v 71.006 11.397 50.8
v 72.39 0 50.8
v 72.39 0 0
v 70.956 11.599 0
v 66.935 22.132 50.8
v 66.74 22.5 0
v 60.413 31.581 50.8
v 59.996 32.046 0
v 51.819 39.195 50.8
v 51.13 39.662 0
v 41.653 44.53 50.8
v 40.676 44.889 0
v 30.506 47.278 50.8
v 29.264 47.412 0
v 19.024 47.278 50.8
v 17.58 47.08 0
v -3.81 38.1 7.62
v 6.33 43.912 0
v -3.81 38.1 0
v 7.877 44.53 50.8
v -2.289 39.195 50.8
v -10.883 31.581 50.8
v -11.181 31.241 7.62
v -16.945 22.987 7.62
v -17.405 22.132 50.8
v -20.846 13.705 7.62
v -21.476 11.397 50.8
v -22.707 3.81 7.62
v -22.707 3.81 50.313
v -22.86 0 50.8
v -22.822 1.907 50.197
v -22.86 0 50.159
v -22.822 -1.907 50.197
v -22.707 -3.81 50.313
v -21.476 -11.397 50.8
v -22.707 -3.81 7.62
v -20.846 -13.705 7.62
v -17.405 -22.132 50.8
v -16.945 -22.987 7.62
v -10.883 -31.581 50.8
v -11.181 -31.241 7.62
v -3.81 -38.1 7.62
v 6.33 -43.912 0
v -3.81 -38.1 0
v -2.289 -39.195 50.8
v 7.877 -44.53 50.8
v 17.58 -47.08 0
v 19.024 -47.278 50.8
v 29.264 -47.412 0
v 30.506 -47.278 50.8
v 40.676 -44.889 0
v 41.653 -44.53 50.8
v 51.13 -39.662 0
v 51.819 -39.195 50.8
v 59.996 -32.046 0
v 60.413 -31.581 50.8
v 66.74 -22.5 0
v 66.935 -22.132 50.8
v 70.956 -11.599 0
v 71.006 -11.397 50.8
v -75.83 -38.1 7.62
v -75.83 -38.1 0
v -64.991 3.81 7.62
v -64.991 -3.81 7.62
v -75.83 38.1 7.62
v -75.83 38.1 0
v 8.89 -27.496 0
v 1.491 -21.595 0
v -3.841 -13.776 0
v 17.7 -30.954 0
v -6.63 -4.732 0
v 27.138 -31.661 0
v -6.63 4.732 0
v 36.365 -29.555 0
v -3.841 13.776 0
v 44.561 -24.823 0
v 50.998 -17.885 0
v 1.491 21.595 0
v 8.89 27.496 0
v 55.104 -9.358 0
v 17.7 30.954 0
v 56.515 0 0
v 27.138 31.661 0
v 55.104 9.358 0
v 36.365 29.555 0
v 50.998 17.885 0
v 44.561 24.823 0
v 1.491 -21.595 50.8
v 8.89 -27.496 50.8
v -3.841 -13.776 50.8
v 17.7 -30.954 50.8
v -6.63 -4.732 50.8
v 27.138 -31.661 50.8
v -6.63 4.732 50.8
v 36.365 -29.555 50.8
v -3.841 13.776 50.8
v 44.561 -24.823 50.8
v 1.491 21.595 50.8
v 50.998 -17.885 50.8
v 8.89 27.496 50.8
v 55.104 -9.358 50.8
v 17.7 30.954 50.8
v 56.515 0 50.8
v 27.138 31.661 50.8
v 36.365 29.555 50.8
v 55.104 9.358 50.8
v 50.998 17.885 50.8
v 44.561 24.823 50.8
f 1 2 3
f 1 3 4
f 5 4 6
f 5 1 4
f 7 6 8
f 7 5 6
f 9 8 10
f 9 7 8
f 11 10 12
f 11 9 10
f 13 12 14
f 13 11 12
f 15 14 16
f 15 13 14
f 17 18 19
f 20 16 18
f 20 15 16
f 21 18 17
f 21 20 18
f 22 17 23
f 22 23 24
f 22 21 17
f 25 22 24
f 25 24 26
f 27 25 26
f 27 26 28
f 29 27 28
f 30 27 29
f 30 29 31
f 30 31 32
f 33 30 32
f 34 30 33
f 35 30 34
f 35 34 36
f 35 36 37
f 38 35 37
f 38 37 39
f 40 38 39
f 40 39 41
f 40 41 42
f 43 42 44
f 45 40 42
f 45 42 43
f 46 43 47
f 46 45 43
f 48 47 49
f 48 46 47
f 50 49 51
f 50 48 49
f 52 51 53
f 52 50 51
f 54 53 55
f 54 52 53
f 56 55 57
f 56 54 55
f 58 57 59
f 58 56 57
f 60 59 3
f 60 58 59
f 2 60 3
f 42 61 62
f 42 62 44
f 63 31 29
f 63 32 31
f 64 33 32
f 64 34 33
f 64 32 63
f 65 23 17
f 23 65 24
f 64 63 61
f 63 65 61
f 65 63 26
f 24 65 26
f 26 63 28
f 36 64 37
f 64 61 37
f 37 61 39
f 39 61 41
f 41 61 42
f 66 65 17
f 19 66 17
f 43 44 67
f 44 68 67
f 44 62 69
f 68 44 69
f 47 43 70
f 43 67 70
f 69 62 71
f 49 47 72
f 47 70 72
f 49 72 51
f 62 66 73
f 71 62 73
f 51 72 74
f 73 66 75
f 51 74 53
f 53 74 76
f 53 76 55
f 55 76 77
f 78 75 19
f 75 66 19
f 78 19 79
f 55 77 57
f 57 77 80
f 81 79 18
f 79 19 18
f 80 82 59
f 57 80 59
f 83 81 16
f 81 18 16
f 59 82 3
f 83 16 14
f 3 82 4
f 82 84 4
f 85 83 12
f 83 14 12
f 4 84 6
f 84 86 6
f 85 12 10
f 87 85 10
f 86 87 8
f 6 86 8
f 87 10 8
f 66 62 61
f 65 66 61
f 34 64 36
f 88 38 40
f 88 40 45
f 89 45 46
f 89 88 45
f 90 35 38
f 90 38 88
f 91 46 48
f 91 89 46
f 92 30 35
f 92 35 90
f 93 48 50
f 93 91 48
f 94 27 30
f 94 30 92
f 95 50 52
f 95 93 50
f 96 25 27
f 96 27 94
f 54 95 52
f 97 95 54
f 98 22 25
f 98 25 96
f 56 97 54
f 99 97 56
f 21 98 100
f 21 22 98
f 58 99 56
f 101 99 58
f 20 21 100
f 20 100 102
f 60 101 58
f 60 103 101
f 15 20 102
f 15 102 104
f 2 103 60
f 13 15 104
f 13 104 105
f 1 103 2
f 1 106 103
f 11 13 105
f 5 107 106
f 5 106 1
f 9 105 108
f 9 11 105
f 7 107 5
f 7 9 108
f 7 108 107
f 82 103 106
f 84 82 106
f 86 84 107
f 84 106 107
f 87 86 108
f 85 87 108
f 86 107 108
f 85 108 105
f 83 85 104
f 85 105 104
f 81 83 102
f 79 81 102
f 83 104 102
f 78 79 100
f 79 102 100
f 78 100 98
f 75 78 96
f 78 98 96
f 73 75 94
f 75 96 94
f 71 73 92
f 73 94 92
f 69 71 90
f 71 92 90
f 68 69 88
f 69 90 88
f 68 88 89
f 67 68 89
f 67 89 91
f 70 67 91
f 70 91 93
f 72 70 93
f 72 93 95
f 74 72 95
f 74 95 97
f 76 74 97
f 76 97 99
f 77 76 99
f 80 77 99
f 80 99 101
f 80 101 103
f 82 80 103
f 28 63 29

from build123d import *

# Parameters (mm, degrees)
F0_W     = 75.82964
F0_H     = 7.62
F1_DEPTH = 38.1
F3_DEPTH = 3.81
F4_R     = 47.625
F5_DEPTH = 50.8
F6_R     = 31.75
F7_DEPTH = 50.801


with BuildPart() as f1:
    # F0 (on Front) → F1 (new body, symmetric)
    with BuildSketch(Plane.XZ):
        with Locations((-37.91482, 3.81)):
            Rectangle(F0_W, F0_H)
    extrude(amount=F1_DEPTH, both=True)

    # F2 (on Front) → F3 (join, symmetric)
    with BuildSketch(Plane.XZ):
        Polygon((-22.225, 50.8), (-64.990714, 7.62), (0, 7.62), (0, 50.8), align=None)
    extrude(amount=F3_DEPTH, both=True)

    # F4 (on face) → F5 (join)
    with BuildSketch(Plane.XY.offset(50.8)):
        with Locations((24.765, 0)):
            Circle(F4_R)
    extrude(amount=-F5_DEPTH)

    # F6 (on face) → F7 (cut, through all)
    with BuildSketch(Plane.XY.offset(50.8)):
        with Locations((24.765, 0)):
            Circle(F6_R)
    extrude(amount=-F7_DEPTH, mode=Mode.SUBTRACT)


solid = f1.part
